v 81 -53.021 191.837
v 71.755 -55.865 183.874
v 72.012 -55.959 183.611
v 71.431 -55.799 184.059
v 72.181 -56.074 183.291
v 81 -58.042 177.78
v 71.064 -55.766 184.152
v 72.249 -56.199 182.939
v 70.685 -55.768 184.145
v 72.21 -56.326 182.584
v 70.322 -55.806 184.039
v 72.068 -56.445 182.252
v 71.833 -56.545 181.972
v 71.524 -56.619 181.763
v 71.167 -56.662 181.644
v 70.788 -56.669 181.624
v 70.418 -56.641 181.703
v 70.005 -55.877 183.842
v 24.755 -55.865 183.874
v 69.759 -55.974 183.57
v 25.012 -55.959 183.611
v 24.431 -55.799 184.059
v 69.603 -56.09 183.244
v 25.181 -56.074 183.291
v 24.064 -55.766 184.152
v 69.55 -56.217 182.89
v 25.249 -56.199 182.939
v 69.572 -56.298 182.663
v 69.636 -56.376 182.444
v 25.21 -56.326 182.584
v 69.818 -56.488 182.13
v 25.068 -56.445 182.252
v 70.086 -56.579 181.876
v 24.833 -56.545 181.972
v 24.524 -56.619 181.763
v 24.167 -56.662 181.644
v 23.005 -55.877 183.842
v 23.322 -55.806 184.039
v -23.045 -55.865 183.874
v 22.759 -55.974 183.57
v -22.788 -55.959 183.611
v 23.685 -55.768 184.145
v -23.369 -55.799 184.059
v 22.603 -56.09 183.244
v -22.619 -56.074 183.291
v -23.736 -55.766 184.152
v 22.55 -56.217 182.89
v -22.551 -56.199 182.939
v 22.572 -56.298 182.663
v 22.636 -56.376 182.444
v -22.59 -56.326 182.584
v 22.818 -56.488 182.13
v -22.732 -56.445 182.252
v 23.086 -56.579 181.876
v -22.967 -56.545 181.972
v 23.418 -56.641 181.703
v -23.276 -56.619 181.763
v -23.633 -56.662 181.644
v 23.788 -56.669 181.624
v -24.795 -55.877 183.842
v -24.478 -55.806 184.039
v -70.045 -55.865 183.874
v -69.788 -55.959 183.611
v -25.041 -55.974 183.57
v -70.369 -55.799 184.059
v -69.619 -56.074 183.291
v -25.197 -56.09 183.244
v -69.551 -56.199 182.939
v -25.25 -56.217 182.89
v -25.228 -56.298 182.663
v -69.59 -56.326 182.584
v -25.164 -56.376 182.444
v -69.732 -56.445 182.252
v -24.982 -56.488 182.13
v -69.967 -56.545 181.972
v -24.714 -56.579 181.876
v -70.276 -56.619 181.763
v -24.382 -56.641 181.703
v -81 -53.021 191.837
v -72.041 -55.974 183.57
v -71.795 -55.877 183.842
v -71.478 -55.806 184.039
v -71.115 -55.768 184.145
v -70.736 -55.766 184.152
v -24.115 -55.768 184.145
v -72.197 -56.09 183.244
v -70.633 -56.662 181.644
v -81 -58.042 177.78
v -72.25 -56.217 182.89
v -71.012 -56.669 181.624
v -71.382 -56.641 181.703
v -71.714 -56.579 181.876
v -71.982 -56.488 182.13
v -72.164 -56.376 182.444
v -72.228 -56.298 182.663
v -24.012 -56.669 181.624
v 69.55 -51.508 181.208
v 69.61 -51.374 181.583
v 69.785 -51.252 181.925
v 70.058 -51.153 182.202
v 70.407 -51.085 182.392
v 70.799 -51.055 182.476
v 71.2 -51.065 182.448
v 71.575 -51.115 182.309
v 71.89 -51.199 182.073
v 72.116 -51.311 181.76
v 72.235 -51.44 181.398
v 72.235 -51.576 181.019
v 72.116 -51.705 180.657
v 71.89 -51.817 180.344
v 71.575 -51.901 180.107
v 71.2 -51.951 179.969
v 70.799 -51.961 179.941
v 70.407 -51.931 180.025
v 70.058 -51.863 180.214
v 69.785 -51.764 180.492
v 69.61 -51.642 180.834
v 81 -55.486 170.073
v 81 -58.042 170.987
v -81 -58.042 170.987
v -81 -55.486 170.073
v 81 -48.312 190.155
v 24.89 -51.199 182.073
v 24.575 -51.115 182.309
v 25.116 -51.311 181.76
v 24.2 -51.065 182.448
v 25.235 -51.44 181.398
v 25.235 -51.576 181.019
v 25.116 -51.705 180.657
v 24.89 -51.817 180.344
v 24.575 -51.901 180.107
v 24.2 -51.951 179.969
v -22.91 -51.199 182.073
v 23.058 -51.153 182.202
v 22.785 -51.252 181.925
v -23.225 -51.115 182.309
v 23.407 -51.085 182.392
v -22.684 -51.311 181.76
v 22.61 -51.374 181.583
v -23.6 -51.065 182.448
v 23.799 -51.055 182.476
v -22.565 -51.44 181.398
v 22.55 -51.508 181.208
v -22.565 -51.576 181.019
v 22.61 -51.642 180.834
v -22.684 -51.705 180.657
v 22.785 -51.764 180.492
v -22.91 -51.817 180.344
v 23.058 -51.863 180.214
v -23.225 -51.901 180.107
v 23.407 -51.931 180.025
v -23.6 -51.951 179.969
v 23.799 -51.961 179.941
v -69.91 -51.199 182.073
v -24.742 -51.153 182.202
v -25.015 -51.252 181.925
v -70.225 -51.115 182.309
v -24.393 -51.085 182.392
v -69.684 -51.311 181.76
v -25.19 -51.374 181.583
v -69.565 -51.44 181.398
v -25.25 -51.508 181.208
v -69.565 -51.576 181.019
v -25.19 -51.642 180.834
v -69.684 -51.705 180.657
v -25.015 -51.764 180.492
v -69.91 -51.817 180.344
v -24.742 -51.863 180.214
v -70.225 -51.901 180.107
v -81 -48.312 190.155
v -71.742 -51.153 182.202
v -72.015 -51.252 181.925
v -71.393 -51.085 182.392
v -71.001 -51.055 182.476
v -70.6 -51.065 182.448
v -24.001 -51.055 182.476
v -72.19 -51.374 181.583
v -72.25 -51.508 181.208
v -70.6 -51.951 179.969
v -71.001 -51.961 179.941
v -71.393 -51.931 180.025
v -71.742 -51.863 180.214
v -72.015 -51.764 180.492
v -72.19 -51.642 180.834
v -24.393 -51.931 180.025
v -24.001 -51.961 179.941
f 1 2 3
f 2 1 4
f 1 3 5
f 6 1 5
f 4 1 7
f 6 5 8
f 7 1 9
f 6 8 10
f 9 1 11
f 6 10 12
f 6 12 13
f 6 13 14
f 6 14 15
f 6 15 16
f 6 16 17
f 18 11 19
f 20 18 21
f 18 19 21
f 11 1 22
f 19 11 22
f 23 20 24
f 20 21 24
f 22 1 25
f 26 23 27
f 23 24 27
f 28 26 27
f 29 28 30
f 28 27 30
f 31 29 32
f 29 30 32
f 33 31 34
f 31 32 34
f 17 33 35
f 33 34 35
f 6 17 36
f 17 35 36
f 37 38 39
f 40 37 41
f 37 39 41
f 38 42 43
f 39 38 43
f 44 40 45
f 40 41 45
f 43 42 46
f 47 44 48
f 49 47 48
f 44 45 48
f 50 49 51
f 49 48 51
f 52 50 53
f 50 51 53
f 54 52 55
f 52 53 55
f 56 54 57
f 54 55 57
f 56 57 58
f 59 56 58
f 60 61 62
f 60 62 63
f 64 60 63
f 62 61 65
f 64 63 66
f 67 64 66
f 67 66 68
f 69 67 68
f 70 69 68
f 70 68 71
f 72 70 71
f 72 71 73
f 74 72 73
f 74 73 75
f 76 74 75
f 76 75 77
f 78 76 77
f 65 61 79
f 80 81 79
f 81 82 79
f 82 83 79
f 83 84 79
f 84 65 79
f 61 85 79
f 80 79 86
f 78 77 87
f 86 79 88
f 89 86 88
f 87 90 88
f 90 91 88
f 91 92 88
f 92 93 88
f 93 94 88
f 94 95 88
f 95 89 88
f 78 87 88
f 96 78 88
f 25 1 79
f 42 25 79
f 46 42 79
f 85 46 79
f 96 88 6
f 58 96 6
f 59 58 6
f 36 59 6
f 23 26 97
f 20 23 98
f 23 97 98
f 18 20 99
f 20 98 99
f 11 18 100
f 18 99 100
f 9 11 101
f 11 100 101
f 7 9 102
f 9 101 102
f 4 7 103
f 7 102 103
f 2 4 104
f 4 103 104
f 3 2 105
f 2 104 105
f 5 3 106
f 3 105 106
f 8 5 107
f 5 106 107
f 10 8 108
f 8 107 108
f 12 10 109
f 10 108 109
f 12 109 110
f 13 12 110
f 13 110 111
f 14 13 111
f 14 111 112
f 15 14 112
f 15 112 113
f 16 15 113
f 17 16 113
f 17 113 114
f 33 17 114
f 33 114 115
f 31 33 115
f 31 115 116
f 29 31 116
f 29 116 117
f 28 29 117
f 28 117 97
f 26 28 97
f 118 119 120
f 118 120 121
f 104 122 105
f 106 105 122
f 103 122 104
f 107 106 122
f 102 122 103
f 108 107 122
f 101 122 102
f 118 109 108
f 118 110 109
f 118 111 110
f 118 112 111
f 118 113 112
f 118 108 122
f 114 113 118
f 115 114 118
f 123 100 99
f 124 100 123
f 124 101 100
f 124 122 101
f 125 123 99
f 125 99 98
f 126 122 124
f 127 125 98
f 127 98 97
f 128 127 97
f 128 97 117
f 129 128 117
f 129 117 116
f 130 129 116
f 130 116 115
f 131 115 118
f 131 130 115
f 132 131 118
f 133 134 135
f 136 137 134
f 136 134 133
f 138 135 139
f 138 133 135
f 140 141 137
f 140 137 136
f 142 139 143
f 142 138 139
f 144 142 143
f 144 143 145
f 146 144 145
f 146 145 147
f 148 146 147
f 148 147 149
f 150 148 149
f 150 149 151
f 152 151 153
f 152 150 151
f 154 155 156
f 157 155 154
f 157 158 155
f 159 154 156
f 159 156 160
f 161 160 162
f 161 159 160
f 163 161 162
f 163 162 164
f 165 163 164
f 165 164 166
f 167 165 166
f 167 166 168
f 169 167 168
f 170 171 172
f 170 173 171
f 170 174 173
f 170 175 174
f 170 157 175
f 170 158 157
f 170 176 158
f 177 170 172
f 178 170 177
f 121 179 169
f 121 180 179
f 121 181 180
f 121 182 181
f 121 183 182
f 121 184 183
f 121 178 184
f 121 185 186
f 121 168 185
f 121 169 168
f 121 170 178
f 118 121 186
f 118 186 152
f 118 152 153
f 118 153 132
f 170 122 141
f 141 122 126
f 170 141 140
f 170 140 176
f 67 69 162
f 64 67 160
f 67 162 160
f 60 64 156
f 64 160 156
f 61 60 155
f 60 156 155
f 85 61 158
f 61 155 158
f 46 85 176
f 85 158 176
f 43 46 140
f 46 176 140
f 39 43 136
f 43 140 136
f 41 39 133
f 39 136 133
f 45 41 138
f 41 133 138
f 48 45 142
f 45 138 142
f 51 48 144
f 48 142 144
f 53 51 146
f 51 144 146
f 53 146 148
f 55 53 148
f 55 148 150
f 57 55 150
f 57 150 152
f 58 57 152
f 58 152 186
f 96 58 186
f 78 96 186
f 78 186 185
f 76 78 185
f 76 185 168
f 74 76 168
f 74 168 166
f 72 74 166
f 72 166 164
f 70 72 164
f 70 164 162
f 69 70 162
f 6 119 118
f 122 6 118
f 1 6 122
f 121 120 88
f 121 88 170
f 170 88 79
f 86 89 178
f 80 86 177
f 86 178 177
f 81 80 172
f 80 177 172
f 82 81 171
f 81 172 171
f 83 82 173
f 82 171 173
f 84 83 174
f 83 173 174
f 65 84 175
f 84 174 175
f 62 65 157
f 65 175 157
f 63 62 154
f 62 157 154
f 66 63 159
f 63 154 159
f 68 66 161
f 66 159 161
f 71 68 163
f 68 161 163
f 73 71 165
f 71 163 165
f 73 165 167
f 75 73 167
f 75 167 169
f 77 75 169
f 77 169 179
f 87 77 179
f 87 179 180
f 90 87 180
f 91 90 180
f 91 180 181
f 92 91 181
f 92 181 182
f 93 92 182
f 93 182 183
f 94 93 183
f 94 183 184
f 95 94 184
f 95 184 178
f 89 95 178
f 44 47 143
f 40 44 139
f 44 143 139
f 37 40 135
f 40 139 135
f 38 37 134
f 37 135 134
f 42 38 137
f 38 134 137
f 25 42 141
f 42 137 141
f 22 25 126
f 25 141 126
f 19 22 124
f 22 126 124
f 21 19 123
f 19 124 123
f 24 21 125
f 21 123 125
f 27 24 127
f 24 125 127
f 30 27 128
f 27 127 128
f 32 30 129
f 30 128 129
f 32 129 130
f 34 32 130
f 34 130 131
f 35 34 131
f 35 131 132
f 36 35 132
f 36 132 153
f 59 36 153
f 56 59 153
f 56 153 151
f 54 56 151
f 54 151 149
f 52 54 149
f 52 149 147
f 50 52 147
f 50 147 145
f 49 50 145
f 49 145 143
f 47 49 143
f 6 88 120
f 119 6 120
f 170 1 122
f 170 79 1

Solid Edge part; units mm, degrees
sketch "Sketch1" plane through (0, 0, 0) normal (1, 0, 0) x (0, 1, 0)
  line L0 (-53.0208, 191.8367) -> (-58.0424, 177.7797)
  line L1 (-58.0424, 177.7797) -> (-58.0424, 170.9866)
  line L2 (-58.0424, 170.9866) -> (-55.4859, 170.0733)
  line L3 (-48.3122, 190.1546) -> (-55.4859, 170.0733)
  line L4 (-53.0208, 191.8367) -> (-48.3122, 190.1546)
extrude "Protrusion1" add sketch "Sketch1" along normal mid plane 162
sketch "Sketch2" plane through (0, -51.8991, 180.114) normal (0, 0.9417, -0.3364) x (-1, 0, 0)
  circle A0 centre (-70.9, 1.1621) radius 1.35
  circle A1 centre (-23.9, 1.1621) radius 1.35
  circle A2 centre (23.9, 1.1621) radius 1.35
  circle A3 centre (70.9, 1.1621) radius 1.35
extrude "Cutout1" cut sketch "Sketch2" against normal up to next
